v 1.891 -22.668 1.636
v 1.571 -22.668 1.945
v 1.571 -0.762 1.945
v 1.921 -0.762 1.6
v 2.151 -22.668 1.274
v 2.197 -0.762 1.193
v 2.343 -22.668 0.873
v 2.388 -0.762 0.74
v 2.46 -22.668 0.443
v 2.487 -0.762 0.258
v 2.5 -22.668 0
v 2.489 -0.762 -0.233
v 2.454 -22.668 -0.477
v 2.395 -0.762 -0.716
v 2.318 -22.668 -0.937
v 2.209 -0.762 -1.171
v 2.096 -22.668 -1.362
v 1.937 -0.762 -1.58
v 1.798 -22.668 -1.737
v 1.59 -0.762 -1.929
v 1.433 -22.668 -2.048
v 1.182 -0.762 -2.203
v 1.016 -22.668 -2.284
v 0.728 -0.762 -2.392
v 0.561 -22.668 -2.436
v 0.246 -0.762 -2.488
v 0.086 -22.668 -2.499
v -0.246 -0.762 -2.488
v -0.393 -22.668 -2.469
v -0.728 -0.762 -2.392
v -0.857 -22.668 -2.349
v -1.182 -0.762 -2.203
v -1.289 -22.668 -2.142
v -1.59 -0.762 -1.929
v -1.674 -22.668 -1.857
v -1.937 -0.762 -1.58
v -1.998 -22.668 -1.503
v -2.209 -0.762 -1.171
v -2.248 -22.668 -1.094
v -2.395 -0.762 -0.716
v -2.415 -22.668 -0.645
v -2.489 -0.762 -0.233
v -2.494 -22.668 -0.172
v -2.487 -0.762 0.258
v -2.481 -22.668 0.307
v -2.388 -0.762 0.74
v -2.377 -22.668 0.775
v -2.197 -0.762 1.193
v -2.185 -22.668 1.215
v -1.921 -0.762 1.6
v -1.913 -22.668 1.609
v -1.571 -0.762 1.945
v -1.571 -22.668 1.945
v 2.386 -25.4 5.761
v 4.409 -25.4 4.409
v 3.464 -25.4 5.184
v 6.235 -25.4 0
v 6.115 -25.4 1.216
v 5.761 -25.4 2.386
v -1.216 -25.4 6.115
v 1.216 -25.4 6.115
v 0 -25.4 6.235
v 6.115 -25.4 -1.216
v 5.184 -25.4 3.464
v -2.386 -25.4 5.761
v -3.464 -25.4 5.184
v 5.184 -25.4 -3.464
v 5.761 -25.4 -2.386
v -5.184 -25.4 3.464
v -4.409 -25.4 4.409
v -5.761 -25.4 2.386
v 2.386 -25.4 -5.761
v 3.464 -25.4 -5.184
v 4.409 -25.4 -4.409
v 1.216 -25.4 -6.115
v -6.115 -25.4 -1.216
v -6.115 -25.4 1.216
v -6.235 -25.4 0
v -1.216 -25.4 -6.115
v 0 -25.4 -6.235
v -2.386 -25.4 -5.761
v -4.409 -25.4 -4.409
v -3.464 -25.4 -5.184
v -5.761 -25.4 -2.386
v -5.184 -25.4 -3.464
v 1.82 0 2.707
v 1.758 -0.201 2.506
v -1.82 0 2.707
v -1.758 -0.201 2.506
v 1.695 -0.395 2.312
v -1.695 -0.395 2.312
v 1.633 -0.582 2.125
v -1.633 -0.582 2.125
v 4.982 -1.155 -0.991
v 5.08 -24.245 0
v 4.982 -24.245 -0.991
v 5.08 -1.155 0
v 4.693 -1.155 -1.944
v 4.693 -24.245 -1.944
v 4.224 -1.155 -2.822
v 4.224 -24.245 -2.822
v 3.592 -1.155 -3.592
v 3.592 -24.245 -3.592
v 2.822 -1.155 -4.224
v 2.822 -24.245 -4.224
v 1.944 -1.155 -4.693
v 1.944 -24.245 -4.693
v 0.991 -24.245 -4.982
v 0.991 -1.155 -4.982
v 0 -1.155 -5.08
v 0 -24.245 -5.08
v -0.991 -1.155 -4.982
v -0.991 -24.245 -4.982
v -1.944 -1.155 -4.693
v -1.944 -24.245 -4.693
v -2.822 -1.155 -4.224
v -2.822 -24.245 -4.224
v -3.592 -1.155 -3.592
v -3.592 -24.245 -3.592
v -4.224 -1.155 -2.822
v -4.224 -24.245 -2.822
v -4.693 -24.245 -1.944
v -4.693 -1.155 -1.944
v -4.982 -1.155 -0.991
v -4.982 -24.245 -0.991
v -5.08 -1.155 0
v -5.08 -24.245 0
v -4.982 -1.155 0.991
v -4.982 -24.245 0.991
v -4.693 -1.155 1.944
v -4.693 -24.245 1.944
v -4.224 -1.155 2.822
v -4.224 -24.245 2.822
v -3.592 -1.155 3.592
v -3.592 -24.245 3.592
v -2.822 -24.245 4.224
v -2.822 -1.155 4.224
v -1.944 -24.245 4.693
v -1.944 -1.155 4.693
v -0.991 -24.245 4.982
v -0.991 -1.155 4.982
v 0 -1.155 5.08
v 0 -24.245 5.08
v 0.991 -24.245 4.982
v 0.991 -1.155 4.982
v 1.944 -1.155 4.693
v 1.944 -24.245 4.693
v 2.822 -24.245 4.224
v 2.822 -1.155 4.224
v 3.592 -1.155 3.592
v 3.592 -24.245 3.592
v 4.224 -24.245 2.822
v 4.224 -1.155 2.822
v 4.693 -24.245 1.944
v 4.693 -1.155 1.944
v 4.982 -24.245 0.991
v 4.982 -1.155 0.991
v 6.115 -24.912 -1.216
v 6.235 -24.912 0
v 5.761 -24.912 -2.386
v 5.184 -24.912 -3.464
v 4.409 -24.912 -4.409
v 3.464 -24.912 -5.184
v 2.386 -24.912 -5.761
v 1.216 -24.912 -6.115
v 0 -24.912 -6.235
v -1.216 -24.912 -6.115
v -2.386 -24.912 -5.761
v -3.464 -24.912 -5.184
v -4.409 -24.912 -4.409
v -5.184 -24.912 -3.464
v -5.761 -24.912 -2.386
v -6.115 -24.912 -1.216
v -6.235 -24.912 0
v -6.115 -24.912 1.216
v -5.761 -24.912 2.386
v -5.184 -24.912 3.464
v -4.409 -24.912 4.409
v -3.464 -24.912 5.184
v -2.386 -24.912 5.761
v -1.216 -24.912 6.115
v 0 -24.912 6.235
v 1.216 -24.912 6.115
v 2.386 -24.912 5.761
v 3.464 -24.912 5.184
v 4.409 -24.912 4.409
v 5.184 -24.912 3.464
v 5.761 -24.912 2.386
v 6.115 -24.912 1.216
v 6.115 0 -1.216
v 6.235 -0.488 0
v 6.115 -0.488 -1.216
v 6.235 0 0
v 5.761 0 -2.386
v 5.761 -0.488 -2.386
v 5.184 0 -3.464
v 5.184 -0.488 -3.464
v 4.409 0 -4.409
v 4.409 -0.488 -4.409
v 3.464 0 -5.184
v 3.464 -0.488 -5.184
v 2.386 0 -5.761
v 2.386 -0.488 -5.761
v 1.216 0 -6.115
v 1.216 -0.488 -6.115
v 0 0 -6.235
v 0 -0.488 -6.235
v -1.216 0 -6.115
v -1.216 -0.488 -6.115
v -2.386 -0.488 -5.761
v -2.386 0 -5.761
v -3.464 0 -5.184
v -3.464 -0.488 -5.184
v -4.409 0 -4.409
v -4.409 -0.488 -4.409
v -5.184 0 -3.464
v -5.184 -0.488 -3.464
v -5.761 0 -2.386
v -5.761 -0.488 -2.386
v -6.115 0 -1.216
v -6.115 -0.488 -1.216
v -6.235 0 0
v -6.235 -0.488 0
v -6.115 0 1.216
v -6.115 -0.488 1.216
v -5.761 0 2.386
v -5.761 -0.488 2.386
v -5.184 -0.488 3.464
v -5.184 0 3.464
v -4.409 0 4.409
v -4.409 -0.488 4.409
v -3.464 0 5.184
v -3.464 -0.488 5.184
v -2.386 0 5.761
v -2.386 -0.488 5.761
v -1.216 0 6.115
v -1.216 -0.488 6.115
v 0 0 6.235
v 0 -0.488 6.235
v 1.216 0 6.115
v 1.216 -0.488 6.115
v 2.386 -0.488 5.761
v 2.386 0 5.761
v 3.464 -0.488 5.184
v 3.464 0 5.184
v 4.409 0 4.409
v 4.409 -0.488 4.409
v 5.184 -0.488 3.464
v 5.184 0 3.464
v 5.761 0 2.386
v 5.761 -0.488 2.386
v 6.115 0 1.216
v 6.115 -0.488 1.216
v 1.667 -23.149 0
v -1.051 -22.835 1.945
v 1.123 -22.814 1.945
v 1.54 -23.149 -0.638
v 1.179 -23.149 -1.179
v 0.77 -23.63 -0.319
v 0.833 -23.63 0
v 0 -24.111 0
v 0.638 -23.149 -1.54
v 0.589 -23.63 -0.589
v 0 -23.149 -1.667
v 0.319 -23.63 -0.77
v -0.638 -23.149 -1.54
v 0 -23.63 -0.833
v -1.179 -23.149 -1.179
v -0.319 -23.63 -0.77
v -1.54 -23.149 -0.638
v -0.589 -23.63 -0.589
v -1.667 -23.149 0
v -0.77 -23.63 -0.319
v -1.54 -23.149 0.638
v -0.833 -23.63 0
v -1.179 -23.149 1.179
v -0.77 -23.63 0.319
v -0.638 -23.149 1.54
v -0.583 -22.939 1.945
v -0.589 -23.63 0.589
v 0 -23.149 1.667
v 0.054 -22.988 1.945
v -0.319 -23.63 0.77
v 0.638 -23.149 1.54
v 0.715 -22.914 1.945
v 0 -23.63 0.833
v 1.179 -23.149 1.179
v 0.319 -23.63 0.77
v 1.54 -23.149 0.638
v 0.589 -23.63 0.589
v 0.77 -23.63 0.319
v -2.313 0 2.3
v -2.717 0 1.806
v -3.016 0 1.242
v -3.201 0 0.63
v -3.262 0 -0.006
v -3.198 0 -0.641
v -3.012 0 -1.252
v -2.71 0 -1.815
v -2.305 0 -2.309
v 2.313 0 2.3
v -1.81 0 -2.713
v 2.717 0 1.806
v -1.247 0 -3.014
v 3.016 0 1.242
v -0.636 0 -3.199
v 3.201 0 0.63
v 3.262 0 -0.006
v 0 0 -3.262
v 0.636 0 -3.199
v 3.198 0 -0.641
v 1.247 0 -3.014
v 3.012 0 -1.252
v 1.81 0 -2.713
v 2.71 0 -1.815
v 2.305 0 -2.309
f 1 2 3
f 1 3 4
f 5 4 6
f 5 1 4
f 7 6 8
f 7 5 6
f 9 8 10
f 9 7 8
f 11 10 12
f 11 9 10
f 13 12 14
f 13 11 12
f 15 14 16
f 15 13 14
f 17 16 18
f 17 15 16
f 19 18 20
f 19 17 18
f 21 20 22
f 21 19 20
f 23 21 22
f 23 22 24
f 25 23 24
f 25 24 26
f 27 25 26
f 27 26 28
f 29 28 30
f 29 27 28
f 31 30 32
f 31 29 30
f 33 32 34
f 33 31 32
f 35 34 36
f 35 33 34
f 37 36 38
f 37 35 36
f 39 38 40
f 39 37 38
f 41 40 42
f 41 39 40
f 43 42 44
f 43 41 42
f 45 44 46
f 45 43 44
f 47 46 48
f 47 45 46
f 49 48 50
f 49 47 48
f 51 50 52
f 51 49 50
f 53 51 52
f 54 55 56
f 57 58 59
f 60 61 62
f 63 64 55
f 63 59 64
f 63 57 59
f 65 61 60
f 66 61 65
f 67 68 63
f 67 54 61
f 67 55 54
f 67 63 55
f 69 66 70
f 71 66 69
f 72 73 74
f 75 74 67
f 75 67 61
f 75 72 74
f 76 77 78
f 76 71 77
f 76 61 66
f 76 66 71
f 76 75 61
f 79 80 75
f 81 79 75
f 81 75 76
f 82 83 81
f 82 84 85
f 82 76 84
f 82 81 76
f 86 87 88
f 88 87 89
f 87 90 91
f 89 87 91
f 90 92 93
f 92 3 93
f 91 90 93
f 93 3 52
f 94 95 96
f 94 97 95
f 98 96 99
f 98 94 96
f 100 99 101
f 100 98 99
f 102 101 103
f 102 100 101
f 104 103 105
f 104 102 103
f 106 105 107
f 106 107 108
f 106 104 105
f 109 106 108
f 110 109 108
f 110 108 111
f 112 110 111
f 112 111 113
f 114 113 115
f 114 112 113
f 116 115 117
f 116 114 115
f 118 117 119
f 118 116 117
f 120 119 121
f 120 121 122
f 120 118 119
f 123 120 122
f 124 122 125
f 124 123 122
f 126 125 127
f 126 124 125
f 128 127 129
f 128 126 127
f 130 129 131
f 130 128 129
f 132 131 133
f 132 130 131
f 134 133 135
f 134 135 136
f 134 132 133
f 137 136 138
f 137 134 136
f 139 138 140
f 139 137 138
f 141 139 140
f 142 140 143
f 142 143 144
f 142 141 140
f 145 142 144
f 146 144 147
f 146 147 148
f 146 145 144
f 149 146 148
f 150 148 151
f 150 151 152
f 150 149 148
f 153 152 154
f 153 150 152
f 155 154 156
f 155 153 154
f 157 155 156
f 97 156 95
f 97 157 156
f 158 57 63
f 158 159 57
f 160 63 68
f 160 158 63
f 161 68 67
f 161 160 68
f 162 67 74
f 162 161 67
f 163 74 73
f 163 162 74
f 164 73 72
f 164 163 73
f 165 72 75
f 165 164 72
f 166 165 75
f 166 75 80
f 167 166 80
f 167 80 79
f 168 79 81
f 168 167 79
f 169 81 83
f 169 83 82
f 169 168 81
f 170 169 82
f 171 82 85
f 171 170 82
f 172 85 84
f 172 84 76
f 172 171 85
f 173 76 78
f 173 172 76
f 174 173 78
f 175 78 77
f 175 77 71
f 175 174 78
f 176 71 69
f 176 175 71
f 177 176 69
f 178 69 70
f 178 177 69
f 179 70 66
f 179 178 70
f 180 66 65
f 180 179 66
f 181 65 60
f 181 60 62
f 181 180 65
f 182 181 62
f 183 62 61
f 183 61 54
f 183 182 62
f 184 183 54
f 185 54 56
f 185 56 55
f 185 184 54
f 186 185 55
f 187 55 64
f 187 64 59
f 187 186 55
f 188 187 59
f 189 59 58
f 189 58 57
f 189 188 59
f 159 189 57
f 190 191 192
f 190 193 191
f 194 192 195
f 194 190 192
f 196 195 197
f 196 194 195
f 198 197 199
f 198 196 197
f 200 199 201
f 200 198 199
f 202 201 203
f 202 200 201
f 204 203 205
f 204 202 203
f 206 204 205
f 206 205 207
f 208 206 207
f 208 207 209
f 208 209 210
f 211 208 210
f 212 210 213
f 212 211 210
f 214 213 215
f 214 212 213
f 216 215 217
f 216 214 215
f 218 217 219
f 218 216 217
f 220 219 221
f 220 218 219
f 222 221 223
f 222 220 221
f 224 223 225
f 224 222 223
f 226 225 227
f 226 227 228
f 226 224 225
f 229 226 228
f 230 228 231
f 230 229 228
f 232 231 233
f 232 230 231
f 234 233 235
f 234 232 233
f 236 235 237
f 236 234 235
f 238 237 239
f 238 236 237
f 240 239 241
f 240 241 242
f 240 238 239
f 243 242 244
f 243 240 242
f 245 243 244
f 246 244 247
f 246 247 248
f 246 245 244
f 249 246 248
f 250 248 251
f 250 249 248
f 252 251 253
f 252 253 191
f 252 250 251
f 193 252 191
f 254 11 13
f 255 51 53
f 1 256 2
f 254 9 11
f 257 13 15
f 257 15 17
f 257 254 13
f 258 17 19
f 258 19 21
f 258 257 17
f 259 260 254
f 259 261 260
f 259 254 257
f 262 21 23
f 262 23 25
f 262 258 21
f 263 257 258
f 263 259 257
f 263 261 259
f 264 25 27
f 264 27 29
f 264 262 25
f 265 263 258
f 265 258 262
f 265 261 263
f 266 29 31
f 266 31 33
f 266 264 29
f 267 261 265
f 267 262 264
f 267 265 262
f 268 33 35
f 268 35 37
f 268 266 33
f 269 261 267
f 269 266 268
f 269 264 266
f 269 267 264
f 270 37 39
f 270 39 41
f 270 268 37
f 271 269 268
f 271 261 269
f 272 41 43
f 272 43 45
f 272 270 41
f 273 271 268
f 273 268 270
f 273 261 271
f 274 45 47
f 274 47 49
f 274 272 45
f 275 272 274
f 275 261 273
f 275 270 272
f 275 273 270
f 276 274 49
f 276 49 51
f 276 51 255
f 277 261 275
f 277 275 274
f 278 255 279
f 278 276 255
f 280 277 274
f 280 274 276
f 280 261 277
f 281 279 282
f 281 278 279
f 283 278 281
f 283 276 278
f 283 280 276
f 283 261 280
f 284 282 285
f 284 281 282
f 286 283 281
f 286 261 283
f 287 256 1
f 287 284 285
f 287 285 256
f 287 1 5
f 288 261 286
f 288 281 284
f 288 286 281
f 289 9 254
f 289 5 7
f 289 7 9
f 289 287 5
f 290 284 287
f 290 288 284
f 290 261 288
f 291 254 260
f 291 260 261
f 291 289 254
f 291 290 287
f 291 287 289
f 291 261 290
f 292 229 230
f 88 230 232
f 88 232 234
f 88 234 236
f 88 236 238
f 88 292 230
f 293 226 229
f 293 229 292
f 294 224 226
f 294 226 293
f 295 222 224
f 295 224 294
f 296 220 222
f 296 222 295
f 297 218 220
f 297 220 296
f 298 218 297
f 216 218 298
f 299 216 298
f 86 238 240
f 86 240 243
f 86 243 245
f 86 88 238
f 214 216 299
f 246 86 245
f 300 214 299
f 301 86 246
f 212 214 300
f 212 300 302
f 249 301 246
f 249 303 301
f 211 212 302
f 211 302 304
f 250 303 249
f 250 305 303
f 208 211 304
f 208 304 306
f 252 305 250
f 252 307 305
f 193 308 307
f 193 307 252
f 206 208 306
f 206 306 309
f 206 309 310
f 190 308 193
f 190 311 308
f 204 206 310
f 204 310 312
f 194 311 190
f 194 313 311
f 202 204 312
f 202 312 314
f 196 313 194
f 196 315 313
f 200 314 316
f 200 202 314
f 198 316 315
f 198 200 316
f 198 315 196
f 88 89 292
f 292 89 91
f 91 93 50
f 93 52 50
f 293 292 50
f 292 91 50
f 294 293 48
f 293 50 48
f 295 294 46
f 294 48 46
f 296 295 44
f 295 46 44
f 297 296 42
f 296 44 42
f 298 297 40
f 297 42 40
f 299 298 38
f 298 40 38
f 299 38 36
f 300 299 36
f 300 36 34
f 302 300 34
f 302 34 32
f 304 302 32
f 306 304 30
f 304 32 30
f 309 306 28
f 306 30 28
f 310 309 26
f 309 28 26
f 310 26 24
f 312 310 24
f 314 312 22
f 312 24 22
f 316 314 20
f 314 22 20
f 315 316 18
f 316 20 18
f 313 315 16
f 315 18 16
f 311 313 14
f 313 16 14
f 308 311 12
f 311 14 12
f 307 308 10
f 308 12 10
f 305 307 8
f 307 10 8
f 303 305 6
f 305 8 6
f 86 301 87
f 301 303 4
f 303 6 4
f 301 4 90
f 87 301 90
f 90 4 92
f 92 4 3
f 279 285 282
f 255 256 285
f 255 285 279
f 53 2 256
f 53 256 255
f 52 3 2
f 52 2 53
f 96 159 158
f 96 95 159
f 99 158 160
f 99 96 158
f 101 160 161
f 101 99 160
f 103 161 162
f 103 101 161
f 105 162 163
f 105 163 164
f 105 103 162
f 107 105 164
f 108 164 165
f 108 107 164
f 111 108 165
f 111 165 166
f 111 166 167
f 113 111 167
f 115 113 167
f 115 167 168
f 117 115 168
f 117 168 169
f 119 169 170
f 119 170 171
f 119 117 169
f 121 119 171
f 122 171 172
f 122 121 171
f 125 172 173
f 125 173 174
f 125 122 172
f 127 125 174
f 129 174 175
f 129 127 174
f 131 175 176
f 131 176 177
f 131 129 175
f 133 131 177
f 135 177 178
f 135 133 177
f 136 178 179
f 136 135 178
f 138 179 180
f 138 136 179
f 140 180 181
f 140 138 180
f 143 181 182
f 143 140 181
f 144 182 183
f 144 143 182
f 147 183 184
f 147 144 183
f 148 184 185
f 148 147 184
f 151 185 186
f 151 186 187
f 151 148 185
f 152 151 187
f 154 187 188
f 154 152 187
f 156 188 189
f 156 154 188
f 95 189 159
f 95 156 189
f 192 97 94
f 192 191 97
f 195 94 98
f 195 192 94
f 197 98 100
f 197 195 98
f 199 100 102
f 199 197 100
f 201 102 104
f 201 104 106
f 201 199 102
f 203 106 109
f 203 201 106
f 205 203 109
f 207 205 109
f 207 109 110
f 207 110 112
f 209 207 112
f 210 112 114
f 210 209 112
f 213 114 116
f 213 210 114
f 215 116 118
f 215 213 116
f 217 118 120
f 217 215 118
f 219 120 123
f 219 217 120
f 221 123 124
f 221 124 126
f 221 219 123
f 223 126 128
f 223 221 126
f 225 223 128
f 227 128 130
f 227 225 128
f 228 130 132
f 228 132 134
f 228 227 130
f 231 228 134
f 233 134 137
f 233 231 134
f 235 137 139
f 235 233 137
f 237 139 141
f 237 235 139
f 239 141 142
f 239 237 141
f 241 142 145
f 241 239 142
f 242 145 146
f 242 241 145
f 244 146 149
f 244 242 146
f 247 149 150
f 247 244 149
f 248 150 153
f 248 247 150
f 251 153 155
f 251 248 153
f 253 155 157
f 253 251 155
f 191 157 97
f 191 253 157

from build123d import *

# Parameters (mm, degrees)
F4_SIZE = 0.762


with BuildPart() as f1:
    # F0 (on Top) → F1 (revolve)
    with BuildSketch(Plane.XY):
        Polygon((0, -25.4), (2.5, -25.4), (2.5, -22.6676009336), (0, -24.1109766066), align=None)
        Polygon((2.5, -22.6676009336), (2.5, -25.4), (6.2352499547, -25.4), (6.2352499547, -24.9117339176), (5.08, -24.2447500453), (5.08, -1.1552499547), (6.2352499547, -0.4882660824), (6.2352499547, 0), (2.5, 0), align=None)
    revolve(axis=Axis((0, -12.0554883033, 0), (0, 1, 0)))

    # F2 (on face) → F3 (join, up to the next surface of F1)
    with BuildSketch(Plane(origin=(0, 0, 0), x_dir=(-1, 0, 0), z_dir=(0, 1, 0))):
        with BuildLine():
            ThreePointArc((1.570660689, 1.945), (0, 2.5), (-1.570660689, 1.945))
            Line((-1.570660689, 1.945), (1.570660689, 1.945))
        make_face()
    extrude(until=Until.NEXT, dir=(0, -1, 0))

    # F4
    f4_edges = [f1.edges().sort_by_distance(p)[0] for p in [
        (0, 0, -2.5),
        (0, 0, 1.945),
    ]]
    chamfer(f4_edges, length=F4_SIZE)


solid = f1.part
